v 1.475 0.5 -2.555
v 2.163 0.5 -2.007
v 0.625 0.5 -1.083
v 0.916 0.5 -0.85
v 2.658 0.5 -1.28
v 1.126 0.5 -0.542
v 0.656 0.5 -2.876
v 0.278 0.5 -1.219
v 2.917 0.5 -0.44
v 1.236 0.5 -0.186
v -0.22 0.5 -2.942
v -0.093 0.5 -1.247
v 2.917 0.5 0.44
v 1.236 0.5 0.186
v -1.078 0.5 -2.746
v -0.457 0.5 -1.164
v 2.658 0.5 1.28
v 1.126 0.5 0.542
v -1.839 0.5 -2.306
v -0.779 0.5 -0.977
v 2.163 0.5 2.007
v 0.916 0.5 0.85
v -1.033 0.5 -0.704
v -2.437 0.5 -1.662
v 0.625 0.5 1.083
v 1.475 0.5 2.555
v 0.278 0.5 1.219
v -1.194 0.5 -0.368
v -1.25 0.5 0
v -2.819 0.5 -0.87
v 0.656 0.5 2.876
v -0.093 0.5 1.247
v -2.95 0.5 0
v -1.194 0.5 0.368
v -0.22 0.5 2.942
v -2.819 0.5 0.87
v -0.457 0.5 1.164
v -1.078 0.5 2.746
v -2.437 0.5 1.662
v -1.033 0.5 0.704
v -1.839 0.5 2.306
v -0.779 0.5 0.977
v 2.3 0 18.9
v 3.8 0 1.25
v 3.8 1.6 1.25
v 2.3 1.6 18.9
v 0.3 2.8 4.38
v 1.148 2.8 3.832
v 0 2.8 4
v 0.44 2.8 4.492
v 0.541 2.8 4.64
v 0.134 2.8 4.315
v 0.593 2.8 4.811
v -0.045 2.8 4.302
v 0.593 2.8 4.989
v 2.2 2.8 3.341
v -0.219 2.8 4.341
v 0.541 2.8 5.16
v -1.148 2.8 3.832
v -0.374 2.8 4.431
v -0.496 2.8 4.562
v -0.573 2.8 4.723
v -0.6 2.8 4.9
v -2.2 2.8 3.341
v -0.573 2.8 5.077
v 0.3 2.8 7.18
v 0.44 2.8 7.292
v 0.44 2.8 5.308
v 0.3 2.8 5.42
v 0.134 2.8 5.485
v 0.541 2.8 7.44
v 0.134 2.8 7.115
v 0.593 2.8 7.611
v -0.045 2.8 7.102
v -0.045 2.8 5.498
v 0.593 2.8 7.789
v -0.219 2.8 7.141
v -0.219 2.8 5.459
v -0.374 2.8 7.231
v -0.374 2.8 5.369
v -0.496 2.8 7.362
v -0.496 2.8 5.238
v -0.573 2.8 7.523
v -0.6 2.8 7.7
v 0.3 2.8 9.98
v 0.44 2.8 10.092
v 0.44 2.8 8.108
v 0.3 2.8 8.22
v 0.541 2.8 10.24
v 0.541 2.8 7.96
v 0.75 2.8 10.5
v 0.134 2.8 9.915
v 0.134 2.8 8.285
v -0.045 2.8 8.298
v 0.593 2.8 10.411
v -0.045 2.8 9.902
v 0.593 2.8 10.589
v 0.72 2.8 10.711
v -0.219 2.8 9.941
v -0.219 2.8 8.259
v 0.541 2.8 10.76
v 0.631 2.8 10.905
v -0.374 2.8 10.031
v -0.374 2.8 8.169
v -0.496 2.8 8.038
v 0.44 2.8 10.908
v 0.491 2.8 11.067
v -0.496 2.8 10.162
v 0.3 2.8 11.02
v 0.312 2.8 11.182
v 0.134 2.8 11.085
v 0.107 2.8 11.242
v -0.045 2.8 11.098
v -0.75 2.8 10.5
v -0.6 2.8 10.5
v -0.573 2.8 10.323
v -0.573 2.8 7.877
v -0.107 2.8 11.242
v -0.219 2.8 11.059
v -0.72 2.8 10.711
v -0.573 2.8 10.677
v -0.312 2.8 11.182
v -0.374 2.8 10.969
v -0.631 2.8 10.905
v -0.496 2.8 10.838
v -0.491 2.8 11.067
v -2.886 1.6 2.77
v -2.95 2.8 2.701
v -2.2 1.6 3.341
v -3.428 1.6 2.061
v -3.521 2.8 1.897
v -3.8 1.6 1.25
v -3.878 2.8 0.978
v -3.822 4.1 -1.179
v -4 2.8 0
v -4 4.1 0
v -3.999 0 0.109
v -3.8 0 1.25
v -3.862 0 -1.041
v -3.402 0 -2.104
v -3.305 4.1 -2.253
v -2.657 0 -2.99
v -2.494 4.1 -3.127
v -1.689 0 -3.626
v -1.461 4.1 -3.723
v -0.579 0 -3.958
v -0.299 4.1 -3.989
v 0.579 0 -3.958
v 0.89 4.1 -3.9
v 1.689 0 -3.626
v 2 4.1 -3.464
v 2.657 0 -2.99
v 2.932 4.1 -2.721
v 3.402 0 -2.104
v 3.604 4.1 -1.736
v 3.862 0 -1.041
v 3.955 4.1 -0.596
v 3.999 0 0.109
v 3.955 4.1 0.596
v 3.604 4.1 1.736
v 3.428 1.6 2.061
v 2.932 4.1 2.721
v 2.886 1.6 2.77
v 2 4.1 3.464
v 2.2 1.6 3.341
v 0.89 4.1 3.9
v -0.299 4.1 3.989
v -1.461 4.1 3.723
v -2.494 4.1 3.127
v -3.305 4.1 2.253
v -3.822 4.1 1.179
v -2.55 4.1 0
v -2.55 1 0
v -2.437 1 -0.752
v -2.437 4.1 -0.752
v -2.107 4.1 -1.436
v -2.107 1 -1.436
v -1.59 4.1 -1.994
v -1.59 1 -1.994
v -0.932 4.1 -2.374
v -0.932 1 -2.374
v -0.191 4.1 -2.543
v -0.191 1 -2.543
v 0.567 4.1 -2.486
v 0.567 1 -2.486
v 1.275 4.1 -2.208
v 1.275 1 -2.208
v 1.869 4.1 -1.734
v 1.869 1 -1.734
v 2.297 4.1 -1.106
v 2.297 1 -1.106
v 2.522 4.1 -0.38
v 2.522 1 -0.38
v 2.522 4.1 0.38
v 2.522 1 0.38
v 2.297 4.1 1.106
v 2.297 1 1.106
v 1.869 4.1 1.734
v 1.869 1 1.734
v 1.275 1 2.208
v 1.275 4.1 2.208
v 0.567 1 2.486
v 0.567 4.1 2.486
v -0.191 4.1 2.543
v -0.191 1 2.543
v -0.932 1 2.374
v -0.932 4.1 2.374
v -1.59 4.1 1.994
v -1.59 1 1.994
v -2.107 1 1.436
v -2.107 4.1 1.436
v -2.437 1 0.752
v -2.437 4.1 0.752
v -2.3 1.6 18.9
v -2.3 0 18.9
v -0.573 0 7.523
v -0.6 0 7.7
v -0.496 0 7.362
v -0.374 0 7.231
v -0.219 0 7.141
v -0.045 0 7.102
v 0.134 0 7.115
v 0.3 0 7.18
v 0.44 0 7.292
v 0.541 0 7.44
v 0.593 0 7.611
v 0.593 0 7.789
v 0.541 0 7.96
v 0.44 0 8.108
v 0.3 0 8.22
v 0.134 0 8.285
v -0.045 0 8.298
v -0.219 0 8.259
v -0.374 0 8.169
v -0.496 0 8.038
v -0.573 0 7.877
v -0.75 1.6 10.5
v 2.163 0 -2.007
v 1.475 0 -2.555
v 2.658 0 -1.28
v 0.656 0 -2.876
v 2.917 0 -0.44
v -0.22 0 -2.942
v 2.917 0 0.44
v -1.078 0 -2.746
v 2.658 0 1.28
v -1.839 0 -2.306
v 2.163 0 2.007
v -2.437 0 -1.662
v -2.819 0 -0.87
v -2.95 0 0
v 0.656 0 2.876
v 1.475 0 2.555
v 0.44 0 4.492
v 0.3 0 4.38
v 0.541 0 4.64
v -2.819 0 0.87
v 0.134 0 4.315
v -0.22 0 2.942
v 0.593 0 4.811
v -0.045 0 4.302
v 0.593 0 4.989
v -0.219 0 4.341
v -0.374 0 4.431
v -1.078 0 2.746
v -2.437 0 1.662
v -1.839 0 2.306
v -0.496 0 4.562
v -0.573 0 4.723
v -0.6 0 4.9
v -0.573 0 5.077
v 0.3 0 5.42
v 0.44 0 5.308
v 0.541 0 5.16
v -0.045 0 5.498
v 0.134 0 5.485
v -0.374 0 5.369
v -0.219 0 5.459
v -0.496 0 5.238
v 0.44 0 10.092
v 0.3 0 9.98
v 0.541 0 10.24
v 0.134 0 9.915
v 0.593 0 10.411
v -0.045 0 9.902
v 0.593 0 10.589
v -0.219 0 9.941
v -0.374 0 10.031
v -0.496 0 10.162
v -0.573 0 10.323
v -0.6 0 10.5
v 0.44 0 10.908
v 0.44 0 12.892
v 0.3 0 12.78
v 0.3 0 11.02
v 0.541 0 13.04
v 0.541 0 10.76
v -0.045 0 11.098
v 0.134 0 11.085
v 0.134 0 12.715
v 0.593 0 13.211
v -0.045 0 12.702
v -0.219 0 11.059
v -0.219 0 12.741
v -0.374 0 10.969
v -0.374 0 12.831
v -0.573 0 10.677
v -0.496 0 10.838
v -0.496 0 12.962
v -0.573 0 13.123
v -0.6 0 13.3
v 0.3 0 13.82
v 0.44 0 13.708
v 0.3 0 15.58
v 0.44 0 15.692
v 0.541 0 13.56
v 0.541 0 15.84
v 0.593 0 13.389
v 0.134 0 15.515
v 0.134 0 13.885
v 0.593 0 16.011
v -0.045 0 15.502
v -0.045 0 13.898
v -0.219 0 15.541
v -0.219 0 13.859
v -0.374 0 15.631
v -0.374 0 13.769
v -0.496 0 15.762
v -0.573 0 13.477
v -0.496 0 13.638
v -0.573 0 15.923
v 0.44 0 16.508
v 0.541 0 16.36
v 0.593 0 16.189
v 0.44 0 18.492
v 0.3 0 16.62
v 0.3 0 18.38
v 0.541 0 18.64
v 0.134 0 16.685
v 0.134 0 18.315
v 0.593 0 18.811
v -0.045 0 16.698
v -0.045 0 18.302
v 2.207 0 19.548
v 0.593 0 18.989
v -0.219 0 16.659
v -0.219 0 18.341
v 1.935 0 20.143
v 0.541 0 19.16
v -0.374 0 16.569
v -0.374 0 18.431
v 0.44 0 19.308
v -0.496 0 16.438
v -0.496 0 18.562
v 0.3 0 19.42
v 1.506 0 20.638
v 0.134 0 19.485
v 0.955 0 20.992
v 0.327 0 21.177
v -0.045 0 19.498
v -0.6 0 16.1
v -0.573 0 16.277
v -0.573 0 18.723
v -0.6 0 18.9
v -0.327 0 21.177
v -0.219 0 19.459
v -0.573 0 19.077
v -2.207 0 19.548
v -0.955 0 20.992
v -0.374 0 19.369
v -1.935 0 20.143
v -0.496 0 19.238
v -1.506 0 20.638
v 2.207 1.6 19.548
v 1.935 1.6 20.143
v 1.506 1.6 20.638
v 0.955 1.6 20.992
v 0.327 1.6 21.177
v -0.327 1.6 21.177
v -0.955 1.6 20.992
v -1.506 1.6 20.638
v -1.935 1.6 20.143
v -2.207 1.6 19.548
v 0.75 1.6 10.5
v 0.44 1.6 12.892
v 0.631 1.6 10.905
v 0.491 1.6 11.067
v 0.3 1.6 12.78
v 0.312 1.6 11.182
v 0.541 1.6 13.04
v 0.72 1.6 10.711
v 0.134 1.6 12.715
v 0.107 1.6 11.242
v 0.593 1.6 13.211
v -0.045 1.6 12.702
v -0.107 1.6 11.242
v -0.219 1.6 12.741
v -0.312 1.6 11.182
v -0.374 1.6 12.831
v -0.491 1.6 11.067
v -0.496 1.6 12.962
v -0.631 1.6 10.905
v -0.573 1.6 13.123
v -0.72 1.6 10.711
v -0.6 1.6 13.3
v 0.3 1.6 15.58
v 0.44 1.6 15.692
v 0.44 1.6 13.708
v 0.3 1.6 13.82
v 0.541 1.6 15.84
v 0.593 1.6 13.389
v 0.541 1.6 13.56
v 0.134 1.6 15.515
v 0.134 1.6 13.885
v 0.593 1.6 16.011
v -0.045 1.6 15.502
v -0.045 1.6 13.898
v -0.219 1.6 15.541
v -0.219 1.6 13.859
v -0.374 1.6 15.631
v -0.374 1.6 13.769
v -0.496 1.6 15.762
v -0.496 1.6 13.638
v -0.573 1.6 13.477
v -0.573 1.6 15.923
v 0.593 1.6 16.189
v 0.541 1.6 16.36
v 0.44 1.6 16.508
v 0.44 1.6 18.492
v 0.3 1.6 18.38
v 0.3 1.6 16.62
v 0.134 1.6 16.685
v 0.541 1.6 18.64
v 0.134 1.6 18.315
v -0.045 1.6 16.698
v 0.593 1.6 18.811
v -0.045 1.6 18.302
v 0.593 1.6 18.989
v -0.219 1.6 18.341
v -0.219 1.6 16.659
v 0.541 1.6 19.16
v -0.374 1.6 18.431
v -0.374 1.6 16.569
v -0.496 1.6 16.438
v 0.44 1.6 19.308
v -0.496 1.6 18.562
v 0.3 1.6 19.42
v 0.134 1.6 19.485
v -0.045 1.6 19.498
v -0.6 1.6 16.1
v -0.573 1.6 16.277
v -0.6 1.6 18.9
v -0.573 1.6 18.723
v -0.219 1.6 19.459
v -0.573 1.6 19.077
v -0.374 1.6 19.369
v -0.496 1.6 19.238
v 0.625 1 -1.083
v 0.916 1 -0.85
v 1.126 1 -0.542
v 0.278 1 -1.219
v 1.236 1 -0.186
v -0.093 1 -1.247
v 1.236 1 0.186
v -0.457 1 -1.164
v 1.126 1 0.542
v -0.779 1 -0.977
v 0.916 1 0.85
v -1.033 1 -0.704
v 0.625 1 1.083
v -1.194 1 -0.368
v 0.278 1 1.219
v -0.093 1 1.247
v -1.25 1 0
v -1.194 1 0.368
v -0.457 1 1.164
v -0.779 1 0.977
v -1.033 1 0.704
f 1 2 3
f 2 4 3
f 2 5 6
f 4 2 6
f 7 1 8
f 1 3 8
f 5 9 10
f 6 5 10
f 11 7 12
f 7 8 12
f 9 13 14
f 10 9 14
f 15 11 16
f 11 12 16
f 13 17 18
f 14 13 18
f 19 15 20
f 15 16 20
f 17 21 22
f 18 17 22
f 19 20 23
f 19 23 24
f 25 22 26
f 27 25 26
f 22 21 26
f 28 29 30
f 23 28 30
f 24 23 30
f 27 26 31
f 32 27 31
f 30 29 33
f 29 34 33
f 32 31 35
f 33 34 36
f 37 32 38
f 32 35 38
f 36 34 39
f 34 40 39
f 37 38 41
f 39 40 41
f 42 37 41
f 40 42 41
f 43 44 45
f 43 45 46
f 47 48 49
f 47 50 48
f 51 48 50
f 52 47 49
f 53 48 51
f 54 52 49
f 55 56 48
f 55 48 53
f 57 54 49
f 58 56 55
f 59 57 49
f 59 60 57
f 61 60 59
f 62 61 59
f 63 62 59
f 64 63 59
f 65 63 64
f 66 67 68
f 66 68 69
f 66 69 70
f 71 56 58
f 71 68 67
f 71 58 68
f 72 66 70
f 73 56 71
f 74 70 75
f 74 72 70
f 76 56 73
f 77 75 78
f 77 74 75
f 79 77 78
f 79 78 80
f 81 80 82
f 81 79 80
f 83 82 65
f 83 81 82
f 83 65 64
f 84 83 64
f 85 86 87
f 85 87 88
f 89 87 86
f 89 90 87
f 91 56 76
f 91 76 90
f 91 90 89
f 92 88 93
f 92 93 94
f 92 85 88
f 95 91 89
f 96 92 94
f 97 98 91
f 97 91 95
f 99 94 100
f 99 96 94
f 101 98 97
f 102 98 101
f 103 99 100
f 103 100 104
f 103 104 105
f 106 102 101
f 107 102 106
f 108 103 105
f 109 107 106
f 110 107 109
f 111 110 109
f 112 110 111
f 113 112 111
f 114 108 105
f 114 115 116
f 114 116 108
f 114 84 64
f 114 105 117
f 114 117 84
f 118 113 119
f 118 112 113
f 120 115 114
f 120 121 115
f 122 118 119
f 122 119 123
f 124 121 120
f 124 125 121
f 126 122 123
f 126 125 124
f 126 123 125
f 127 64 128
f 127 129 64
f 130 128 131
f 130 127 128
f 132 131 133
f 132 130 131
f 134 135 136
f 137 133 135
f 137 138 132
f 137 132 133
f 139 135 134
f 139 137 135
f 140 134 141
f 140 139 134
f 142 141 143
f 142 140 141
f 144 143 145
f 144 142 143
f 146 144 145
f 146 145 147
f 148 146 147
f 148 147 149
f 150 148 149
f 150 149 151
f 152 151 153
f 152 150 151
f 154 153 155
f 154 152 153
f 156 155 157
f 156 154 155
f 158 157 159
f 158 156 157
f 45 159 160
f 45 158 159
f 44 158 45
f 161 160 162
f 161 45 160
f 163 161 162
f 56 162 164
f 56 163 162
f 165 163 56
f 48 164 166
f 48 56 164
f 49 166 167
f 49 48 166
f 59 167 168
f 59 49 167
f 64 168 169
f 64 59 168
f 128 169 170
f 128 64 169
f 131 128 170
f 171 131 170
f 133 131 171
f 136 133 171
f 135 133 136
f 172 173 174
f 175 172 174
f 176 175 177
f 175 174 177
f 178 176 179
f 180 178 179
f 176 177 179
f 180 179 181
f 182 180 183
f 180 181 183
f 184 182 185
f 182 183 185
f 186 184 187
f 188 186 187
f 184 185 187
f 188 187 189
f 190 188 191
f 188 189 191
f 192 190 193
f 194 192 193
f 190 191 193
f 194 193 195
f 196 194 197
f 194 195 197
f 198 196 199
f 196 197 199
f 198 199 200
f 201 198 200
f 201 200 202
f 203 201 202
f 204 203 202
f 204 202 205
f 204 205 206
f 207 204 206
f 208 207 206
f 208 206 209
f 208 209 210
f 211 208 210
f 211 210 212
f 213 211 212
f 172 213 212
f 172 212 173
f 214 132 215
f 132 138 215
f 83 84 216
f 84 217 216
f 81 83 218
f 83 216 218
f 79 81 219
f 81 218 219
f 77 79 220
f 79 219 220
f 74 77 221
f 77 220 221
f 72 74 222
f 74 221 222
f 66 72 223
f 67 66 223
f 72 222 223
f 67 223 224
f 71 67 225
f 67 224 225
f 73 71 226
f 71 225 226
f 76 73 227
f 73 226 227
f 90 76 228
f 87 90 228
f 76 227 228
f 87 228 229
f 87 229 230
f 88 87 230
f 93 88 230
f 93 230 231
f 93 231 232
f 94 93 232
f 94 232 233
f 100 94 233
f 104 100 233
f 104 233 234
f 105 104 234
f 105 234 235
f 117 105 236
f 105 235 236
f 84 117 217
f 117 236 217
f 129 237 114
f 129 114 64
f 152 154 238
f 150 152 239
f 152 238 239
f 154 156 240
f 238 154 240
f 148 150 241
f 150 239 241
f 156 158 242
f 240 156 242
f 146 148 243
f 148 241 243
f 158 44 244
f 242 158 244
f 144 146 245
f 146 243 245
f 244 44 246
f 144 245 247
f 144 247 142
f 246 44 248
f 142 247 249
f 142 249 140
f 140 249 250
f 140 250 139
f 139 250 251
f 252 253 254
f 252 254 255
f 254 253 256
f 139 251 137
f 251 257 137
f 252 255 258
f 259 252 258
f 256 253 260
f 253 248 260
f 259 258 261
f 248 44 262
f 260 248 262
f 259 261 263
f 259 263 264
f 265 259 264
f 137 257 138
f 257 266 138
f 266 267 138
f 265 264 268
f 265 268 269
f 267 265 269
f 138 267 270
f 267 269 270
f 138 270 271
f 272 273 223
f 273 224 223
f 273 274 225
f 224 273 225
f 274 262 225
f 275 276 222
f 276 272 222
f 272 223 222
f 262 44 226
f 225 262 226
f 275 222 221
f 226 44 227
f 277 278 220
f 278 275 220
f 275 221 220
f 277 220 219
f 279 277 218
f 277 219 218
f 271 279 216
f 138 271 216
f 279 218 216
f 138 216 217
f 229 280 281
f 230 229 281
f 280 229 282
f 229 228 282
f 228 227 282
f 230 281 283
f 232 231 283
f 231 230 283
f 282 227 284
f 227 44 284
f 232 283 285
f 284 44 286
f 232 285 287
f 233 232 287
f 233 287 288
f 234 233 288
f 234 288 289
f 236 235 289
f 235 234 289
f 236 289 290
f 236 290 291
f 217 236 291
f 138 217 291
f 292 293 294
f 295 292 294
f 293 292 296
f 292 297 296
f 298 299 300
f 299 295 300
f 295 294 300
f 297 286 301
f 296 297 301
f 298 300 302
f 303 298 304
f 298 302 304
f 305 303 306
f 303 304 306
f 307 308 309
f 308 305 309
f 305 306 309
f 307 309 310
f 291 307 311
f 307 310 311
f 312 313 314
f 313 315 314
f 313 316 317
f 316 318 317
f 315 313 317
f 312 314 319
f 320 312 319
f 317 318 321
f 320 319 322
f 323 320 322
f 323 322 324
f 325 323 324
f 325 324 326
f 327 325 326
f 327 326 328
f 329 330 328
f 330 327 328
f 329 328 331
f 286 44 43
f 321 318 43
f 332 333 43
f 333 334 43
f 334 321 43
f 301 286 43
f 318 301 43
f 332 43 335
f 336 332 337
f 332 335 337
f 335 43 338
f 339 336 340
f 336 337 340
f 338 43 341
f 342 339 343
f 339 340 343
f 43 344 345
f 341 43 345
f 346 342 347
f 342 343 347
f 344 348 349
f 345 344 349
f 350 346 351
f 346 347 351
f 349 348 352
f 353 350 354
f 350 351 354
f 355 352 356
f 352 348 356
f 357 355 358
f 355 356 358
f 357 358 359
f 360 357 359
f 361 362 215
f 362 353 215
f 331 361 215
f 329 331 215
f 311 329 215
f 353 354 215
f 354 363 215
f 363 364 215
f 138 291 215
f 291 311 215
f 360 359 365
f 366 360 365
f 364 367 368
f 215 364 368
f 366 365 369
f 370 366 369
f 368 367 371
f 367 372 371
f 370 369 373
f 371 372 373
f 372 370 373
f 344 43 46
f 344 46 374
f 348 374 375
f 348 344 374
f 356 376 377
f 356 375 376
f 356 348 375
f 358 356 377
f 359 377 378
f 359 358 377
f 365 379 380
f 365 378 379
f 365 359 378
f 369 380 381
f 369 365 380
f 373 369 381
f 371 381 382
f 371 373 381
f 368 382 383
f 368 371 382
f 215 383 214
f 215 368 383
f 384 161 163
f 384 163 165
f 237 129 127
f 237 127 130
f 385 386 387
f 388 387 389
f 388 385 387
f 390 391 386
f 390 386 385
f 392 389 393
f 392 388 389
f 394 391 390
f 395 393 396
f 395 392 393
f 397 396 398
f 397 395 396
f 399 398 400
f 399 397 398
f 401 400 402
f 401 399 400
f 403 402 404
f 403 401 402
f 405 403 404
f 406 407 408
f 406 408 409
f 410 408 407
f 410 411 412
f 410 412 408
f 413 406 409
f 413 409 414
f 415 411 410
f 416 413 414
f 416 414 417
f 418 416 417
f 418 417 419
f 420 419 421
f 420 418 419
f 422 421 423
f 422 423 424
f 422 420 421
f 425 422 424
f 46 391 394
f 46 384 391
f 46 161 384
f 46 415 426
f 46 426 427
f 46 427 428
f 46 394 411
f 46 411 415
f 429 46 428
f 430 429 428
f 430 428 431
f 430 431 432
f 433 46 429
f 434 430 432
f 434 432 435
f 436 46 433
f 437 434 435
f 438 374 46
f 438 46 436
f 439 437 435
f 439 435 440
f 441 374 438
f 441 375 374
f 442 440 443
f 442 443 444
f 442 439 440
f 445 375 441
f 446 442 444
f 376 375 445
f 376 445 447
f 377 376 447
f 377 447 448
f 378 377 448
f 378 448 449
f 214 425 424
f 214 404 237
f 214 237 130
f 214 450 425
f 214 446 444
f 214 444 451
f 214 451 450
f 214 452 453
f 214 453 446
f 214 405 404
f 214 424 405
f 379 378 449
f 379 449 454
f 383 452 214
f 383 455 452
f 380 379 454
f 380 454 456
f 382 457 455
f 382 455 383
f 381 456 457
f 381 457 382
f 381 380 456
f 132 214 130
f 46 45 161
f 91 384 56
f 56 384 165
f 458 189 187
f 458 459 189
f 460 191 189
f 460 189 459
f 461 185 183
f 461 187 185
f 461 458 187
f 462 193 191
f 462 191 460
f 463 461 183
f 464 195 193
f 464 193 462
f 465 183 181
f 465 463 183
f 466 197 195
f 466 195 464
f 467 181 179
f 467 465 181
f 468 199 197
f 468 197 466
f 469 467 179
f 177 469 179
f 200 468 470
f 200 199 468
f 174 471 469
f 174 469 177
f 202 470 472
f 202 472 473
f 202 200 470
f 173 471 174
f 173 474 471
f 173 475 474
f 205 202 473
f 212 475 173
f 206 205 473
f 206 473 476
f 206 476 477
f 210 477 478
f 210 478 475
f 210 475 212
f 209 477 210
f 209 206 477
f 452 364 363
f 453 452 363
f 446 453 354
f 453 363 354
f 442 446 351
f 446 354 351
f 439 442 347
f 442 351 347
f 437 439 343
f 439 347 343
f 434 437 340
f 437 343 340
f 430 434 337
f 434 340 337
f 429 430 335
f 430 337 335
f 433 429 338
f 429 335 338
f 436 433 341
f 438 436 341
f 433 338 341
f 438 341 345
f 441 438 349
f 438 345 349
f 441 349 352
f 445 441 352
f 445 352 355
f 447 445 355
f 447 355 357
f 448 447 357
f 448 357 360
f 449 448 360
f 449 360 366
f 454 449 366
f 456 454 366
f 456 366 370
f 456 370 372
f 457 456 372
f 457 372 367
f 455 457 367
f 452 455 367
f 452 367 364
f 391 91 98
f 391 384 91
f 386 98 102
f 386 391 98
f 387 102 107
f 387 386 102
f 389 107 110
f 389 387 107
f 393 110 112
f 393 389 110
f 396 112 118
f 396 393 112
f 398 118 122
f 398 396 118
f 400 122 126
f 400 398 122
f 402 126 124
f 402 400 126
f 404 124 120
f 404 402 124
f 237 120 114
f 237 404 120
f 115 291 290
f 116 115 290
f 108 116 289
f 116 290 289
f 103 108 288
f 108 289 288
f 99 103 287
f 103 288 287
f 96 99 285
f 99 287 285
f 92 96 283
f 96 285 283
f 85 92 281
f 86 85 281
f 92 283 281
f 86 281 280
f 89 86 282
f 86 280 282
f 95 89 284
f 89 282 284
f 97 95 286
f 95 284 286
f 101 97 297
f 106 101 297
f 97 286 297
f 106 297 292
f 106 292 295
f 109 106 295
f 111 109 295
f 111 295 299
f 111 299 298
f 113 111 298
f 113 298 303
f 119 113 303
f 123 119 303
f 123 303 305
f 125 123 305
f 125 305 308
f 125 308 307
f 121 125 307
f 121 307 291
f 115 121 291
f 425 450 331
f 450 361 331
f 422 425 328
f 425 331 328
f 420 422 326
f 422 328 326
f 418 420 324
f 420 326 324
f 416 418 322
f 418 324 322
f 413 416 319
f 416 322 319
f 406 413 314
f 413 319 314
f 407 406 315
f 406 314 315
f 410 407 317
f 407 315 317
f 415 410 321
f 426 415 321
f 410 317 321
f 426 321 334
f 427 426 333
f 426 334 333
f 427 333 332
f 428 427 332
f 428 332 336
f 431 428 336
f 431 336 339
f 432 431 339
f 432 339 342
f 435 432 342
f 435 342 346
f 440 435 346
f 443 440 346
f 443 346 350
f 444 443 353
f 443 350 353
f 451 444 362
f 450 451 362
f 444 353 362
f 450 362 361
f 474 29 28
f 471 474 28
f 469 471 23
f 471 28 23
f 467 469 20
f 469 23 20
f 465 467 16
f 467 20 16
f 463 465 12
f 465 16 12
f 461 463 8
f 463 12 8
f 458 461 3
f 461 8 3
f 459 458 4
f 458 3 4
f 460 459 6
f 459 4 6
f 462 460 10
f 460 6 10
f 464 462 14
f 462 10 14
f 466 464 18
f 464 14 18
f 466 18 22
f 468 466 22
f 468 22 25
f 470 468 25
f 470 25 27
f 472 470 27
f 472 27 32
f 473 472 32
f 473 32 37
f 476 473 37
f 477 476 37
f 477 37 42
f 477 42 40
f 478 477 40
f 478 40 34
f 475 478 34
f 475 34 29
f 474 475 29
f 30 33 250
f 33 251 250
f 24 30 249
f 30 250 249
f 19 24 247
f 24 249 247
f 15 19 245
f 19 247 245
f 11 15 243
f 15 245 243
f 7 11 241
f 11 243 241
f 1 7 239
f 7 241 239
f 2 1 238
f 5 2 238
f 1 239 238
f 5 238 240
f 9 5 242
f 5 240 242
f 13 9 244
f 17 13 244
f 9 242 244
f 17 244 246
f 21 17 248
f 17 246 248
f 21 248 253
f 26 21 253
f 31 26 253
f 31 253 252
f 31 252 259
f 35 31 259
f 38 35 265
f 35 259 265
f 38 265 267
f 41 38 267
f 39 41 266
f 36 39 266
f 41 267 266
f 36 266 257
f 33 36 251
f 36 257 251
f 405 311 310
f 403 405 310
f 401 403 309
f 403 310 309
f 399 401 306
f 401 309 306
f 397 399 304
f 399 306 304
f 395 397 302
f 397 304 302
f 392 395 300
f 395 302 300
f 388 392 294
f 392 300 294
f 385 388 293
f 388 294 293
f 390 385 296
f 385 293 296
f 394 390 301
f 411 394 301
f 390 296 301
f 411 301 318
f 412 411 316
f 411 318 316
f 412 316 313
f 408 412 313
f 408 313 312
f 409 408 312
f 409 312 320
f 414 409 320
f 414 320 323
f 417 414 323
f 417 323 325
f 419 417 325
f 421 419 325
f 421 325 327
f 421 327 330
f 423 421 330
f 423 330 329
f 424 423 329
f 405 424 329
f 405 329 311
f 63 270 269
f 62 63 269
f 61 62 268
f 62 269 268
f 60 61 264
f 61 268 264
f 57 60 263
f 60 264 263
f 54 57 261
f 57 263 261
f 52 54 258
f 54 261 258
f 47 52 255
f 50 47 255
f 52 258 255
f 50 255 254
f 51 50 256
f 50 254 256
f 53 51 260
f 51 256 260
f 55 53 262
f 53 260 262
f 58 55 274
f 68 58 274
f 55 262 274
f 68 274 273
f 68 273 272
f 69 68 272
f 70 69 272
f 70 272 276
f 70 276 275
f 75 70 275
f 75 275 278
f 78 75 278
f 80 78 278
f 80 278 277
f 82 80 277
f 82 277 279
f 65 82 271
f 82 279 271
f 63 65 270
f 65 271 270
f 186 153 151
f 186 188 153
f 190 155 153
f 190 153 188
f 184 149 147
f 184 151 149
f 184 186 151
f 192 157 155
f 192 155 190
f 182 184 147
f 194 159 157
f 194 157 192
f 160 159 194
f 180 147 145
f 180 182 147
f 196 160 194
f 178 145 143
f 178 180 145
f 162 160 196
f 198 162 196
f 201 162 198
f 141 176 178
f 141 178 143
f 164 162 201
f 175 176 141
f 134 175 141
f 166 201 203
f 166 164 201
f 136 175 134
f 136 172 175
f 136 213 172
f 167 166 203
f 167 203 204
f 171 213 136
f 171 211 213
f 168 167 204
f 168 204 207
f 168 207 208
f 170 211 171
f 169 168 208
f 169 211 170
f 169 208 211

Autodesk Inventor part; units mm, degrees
ref_plane "YZ Plane" through (0, 0, 0) normal (1, 0, 0) x (0, 1, 0)
ref_plane "XZ Plane" through (0, 0, 0) normal (0, 1, 0) x (-1, 0, 0)
ref_plane "XY Plane" through (0, 0, 0) normal (0, 0, 1) x (1, 0, 0)
sketch "Skizze1" plane through (0, 0, 0) normal (0, 1, 0) x (-1, 0, 0)
  circle A0 centre (0, 0) radius 4
  circle A1 centre (0, 0) radius 1.25
  line L0 (0, -4) -> (0, 21.2)
  line L1 (0, 21.2) -> (0, 18.9)
  circle A2 centre (0, 18.9) radius 0.6
  circle A3 centre (0, 18.9) radius 2.3
  line L2 (0, 18.9) -> (0, 16.1)
  line L3 (0, 16.1) -> (0, 13.3)
  circle A4 centre (0, 16.1) radius 0.6
  line L4 (0, 16.1) -> (0, 13.3)
  circle A5 centre (0, 13.3) radius 0.6
  line L5 (0, 13.3) -> (0, 10.5)
  circle A6 centre (0, 10.5) radius 0.6
  line L6 (0, 10.5) -> (0, 7.7)
  circle A7 centre (0, 7.7) radius 0.6
  line L7 (0, 7.7) -> (0, 4.9)
  circle A8 centre (0, 4.9) radius 0.6
  circle A9 centre (0, 10.5) radius 0.75
  line L8 (0.75, 10.5) -> (2.2, 3.3407)
  line L9 (-0.75, 10.5) -> (-2.2, 3.3407)
  circle A10 centre (0, 0) radius 2.95
  circle A11 centre (0, 0) radius 2.55
  line L10 (-3.7997, 1.25) -> (-2.3, 18.9)
  line L11 (3.7997, 1.25) -> (2.3, 18.9)
  point P0 (-4, 0)
  point P1 (4, 0)
  point P2 (0.3, 16.6196)
  point P3 (-0.3, 16.6196)
  dimension "d0" = 8
  dimension "d2" = 2.5
  dimension "d4" = 25.2
  dimension "d5" = 2.3
  dimension "d6" = 1.2
  dimension "d7" = 2.8
  dimension "d10" = 1.2
  dimension "d11" = 2.8
  dimension "d12" = 1.2
  dimension "d13" = 2.8
  dimension "d14" = 1.2
  dimension "d15" = 2.8
  dimension "d16" = 1.2
  dimension "d17" = 2.8
  dimension "d18" = 1.2
  dimension "d19" = 1.5
  dimension "d20" = 5.9
  dimension "d21" = 5.1
extrude "Extrusion1" add sketch "Skizze1" along normal blind 1.6 contours A0 L0 A10 | A0 L8 A9 L0 A5 A4 A3 L11 | A0 L0 A10 | A0 L0 A8 A7 A9 L8 | A3 A4 L0 A2 | L10 A3 A4 L0 A5 A9 L9 A0 | A10 L0 A11 | L0 A11 A10 | A0 L9 A9 L0 A7 A8 | A9 L0 A6 | L0 A2 A4 A3 | L0 A6 A9
extrude "Extrusion2" add sketch "Skizze1" along normal blind 2.8 contours A0 L0 A10 | A0 L0 A10 | A0 L0 A8 A7 A9 L8 | A10 L0 A11 | L0 A11 A10 | A0 L9 A9 L0 A7 A8 | A9 L0 A6 | L0 A6 A9
extrude "Extrusion3" add sketch "Skizze1" along normal blind 4.1 contours A0 L0 A10 | A0 L0 A10 | A10 L0 A11 | L0 A11 A10
extrude "Extrusion4" add sketch "Skizze1" along normal blind 1 contours A11 L0 A1 | L0 A1 A11
extrude "Extrusion5" cut sketch "Skizze1" along normal blind 0.5 contours A10 L0 A11 | L0 A11 A10 | A11 L0 A1 | L0 A1 A11
properties part number "weißes_ding" material "Plastic, Opaque White"
